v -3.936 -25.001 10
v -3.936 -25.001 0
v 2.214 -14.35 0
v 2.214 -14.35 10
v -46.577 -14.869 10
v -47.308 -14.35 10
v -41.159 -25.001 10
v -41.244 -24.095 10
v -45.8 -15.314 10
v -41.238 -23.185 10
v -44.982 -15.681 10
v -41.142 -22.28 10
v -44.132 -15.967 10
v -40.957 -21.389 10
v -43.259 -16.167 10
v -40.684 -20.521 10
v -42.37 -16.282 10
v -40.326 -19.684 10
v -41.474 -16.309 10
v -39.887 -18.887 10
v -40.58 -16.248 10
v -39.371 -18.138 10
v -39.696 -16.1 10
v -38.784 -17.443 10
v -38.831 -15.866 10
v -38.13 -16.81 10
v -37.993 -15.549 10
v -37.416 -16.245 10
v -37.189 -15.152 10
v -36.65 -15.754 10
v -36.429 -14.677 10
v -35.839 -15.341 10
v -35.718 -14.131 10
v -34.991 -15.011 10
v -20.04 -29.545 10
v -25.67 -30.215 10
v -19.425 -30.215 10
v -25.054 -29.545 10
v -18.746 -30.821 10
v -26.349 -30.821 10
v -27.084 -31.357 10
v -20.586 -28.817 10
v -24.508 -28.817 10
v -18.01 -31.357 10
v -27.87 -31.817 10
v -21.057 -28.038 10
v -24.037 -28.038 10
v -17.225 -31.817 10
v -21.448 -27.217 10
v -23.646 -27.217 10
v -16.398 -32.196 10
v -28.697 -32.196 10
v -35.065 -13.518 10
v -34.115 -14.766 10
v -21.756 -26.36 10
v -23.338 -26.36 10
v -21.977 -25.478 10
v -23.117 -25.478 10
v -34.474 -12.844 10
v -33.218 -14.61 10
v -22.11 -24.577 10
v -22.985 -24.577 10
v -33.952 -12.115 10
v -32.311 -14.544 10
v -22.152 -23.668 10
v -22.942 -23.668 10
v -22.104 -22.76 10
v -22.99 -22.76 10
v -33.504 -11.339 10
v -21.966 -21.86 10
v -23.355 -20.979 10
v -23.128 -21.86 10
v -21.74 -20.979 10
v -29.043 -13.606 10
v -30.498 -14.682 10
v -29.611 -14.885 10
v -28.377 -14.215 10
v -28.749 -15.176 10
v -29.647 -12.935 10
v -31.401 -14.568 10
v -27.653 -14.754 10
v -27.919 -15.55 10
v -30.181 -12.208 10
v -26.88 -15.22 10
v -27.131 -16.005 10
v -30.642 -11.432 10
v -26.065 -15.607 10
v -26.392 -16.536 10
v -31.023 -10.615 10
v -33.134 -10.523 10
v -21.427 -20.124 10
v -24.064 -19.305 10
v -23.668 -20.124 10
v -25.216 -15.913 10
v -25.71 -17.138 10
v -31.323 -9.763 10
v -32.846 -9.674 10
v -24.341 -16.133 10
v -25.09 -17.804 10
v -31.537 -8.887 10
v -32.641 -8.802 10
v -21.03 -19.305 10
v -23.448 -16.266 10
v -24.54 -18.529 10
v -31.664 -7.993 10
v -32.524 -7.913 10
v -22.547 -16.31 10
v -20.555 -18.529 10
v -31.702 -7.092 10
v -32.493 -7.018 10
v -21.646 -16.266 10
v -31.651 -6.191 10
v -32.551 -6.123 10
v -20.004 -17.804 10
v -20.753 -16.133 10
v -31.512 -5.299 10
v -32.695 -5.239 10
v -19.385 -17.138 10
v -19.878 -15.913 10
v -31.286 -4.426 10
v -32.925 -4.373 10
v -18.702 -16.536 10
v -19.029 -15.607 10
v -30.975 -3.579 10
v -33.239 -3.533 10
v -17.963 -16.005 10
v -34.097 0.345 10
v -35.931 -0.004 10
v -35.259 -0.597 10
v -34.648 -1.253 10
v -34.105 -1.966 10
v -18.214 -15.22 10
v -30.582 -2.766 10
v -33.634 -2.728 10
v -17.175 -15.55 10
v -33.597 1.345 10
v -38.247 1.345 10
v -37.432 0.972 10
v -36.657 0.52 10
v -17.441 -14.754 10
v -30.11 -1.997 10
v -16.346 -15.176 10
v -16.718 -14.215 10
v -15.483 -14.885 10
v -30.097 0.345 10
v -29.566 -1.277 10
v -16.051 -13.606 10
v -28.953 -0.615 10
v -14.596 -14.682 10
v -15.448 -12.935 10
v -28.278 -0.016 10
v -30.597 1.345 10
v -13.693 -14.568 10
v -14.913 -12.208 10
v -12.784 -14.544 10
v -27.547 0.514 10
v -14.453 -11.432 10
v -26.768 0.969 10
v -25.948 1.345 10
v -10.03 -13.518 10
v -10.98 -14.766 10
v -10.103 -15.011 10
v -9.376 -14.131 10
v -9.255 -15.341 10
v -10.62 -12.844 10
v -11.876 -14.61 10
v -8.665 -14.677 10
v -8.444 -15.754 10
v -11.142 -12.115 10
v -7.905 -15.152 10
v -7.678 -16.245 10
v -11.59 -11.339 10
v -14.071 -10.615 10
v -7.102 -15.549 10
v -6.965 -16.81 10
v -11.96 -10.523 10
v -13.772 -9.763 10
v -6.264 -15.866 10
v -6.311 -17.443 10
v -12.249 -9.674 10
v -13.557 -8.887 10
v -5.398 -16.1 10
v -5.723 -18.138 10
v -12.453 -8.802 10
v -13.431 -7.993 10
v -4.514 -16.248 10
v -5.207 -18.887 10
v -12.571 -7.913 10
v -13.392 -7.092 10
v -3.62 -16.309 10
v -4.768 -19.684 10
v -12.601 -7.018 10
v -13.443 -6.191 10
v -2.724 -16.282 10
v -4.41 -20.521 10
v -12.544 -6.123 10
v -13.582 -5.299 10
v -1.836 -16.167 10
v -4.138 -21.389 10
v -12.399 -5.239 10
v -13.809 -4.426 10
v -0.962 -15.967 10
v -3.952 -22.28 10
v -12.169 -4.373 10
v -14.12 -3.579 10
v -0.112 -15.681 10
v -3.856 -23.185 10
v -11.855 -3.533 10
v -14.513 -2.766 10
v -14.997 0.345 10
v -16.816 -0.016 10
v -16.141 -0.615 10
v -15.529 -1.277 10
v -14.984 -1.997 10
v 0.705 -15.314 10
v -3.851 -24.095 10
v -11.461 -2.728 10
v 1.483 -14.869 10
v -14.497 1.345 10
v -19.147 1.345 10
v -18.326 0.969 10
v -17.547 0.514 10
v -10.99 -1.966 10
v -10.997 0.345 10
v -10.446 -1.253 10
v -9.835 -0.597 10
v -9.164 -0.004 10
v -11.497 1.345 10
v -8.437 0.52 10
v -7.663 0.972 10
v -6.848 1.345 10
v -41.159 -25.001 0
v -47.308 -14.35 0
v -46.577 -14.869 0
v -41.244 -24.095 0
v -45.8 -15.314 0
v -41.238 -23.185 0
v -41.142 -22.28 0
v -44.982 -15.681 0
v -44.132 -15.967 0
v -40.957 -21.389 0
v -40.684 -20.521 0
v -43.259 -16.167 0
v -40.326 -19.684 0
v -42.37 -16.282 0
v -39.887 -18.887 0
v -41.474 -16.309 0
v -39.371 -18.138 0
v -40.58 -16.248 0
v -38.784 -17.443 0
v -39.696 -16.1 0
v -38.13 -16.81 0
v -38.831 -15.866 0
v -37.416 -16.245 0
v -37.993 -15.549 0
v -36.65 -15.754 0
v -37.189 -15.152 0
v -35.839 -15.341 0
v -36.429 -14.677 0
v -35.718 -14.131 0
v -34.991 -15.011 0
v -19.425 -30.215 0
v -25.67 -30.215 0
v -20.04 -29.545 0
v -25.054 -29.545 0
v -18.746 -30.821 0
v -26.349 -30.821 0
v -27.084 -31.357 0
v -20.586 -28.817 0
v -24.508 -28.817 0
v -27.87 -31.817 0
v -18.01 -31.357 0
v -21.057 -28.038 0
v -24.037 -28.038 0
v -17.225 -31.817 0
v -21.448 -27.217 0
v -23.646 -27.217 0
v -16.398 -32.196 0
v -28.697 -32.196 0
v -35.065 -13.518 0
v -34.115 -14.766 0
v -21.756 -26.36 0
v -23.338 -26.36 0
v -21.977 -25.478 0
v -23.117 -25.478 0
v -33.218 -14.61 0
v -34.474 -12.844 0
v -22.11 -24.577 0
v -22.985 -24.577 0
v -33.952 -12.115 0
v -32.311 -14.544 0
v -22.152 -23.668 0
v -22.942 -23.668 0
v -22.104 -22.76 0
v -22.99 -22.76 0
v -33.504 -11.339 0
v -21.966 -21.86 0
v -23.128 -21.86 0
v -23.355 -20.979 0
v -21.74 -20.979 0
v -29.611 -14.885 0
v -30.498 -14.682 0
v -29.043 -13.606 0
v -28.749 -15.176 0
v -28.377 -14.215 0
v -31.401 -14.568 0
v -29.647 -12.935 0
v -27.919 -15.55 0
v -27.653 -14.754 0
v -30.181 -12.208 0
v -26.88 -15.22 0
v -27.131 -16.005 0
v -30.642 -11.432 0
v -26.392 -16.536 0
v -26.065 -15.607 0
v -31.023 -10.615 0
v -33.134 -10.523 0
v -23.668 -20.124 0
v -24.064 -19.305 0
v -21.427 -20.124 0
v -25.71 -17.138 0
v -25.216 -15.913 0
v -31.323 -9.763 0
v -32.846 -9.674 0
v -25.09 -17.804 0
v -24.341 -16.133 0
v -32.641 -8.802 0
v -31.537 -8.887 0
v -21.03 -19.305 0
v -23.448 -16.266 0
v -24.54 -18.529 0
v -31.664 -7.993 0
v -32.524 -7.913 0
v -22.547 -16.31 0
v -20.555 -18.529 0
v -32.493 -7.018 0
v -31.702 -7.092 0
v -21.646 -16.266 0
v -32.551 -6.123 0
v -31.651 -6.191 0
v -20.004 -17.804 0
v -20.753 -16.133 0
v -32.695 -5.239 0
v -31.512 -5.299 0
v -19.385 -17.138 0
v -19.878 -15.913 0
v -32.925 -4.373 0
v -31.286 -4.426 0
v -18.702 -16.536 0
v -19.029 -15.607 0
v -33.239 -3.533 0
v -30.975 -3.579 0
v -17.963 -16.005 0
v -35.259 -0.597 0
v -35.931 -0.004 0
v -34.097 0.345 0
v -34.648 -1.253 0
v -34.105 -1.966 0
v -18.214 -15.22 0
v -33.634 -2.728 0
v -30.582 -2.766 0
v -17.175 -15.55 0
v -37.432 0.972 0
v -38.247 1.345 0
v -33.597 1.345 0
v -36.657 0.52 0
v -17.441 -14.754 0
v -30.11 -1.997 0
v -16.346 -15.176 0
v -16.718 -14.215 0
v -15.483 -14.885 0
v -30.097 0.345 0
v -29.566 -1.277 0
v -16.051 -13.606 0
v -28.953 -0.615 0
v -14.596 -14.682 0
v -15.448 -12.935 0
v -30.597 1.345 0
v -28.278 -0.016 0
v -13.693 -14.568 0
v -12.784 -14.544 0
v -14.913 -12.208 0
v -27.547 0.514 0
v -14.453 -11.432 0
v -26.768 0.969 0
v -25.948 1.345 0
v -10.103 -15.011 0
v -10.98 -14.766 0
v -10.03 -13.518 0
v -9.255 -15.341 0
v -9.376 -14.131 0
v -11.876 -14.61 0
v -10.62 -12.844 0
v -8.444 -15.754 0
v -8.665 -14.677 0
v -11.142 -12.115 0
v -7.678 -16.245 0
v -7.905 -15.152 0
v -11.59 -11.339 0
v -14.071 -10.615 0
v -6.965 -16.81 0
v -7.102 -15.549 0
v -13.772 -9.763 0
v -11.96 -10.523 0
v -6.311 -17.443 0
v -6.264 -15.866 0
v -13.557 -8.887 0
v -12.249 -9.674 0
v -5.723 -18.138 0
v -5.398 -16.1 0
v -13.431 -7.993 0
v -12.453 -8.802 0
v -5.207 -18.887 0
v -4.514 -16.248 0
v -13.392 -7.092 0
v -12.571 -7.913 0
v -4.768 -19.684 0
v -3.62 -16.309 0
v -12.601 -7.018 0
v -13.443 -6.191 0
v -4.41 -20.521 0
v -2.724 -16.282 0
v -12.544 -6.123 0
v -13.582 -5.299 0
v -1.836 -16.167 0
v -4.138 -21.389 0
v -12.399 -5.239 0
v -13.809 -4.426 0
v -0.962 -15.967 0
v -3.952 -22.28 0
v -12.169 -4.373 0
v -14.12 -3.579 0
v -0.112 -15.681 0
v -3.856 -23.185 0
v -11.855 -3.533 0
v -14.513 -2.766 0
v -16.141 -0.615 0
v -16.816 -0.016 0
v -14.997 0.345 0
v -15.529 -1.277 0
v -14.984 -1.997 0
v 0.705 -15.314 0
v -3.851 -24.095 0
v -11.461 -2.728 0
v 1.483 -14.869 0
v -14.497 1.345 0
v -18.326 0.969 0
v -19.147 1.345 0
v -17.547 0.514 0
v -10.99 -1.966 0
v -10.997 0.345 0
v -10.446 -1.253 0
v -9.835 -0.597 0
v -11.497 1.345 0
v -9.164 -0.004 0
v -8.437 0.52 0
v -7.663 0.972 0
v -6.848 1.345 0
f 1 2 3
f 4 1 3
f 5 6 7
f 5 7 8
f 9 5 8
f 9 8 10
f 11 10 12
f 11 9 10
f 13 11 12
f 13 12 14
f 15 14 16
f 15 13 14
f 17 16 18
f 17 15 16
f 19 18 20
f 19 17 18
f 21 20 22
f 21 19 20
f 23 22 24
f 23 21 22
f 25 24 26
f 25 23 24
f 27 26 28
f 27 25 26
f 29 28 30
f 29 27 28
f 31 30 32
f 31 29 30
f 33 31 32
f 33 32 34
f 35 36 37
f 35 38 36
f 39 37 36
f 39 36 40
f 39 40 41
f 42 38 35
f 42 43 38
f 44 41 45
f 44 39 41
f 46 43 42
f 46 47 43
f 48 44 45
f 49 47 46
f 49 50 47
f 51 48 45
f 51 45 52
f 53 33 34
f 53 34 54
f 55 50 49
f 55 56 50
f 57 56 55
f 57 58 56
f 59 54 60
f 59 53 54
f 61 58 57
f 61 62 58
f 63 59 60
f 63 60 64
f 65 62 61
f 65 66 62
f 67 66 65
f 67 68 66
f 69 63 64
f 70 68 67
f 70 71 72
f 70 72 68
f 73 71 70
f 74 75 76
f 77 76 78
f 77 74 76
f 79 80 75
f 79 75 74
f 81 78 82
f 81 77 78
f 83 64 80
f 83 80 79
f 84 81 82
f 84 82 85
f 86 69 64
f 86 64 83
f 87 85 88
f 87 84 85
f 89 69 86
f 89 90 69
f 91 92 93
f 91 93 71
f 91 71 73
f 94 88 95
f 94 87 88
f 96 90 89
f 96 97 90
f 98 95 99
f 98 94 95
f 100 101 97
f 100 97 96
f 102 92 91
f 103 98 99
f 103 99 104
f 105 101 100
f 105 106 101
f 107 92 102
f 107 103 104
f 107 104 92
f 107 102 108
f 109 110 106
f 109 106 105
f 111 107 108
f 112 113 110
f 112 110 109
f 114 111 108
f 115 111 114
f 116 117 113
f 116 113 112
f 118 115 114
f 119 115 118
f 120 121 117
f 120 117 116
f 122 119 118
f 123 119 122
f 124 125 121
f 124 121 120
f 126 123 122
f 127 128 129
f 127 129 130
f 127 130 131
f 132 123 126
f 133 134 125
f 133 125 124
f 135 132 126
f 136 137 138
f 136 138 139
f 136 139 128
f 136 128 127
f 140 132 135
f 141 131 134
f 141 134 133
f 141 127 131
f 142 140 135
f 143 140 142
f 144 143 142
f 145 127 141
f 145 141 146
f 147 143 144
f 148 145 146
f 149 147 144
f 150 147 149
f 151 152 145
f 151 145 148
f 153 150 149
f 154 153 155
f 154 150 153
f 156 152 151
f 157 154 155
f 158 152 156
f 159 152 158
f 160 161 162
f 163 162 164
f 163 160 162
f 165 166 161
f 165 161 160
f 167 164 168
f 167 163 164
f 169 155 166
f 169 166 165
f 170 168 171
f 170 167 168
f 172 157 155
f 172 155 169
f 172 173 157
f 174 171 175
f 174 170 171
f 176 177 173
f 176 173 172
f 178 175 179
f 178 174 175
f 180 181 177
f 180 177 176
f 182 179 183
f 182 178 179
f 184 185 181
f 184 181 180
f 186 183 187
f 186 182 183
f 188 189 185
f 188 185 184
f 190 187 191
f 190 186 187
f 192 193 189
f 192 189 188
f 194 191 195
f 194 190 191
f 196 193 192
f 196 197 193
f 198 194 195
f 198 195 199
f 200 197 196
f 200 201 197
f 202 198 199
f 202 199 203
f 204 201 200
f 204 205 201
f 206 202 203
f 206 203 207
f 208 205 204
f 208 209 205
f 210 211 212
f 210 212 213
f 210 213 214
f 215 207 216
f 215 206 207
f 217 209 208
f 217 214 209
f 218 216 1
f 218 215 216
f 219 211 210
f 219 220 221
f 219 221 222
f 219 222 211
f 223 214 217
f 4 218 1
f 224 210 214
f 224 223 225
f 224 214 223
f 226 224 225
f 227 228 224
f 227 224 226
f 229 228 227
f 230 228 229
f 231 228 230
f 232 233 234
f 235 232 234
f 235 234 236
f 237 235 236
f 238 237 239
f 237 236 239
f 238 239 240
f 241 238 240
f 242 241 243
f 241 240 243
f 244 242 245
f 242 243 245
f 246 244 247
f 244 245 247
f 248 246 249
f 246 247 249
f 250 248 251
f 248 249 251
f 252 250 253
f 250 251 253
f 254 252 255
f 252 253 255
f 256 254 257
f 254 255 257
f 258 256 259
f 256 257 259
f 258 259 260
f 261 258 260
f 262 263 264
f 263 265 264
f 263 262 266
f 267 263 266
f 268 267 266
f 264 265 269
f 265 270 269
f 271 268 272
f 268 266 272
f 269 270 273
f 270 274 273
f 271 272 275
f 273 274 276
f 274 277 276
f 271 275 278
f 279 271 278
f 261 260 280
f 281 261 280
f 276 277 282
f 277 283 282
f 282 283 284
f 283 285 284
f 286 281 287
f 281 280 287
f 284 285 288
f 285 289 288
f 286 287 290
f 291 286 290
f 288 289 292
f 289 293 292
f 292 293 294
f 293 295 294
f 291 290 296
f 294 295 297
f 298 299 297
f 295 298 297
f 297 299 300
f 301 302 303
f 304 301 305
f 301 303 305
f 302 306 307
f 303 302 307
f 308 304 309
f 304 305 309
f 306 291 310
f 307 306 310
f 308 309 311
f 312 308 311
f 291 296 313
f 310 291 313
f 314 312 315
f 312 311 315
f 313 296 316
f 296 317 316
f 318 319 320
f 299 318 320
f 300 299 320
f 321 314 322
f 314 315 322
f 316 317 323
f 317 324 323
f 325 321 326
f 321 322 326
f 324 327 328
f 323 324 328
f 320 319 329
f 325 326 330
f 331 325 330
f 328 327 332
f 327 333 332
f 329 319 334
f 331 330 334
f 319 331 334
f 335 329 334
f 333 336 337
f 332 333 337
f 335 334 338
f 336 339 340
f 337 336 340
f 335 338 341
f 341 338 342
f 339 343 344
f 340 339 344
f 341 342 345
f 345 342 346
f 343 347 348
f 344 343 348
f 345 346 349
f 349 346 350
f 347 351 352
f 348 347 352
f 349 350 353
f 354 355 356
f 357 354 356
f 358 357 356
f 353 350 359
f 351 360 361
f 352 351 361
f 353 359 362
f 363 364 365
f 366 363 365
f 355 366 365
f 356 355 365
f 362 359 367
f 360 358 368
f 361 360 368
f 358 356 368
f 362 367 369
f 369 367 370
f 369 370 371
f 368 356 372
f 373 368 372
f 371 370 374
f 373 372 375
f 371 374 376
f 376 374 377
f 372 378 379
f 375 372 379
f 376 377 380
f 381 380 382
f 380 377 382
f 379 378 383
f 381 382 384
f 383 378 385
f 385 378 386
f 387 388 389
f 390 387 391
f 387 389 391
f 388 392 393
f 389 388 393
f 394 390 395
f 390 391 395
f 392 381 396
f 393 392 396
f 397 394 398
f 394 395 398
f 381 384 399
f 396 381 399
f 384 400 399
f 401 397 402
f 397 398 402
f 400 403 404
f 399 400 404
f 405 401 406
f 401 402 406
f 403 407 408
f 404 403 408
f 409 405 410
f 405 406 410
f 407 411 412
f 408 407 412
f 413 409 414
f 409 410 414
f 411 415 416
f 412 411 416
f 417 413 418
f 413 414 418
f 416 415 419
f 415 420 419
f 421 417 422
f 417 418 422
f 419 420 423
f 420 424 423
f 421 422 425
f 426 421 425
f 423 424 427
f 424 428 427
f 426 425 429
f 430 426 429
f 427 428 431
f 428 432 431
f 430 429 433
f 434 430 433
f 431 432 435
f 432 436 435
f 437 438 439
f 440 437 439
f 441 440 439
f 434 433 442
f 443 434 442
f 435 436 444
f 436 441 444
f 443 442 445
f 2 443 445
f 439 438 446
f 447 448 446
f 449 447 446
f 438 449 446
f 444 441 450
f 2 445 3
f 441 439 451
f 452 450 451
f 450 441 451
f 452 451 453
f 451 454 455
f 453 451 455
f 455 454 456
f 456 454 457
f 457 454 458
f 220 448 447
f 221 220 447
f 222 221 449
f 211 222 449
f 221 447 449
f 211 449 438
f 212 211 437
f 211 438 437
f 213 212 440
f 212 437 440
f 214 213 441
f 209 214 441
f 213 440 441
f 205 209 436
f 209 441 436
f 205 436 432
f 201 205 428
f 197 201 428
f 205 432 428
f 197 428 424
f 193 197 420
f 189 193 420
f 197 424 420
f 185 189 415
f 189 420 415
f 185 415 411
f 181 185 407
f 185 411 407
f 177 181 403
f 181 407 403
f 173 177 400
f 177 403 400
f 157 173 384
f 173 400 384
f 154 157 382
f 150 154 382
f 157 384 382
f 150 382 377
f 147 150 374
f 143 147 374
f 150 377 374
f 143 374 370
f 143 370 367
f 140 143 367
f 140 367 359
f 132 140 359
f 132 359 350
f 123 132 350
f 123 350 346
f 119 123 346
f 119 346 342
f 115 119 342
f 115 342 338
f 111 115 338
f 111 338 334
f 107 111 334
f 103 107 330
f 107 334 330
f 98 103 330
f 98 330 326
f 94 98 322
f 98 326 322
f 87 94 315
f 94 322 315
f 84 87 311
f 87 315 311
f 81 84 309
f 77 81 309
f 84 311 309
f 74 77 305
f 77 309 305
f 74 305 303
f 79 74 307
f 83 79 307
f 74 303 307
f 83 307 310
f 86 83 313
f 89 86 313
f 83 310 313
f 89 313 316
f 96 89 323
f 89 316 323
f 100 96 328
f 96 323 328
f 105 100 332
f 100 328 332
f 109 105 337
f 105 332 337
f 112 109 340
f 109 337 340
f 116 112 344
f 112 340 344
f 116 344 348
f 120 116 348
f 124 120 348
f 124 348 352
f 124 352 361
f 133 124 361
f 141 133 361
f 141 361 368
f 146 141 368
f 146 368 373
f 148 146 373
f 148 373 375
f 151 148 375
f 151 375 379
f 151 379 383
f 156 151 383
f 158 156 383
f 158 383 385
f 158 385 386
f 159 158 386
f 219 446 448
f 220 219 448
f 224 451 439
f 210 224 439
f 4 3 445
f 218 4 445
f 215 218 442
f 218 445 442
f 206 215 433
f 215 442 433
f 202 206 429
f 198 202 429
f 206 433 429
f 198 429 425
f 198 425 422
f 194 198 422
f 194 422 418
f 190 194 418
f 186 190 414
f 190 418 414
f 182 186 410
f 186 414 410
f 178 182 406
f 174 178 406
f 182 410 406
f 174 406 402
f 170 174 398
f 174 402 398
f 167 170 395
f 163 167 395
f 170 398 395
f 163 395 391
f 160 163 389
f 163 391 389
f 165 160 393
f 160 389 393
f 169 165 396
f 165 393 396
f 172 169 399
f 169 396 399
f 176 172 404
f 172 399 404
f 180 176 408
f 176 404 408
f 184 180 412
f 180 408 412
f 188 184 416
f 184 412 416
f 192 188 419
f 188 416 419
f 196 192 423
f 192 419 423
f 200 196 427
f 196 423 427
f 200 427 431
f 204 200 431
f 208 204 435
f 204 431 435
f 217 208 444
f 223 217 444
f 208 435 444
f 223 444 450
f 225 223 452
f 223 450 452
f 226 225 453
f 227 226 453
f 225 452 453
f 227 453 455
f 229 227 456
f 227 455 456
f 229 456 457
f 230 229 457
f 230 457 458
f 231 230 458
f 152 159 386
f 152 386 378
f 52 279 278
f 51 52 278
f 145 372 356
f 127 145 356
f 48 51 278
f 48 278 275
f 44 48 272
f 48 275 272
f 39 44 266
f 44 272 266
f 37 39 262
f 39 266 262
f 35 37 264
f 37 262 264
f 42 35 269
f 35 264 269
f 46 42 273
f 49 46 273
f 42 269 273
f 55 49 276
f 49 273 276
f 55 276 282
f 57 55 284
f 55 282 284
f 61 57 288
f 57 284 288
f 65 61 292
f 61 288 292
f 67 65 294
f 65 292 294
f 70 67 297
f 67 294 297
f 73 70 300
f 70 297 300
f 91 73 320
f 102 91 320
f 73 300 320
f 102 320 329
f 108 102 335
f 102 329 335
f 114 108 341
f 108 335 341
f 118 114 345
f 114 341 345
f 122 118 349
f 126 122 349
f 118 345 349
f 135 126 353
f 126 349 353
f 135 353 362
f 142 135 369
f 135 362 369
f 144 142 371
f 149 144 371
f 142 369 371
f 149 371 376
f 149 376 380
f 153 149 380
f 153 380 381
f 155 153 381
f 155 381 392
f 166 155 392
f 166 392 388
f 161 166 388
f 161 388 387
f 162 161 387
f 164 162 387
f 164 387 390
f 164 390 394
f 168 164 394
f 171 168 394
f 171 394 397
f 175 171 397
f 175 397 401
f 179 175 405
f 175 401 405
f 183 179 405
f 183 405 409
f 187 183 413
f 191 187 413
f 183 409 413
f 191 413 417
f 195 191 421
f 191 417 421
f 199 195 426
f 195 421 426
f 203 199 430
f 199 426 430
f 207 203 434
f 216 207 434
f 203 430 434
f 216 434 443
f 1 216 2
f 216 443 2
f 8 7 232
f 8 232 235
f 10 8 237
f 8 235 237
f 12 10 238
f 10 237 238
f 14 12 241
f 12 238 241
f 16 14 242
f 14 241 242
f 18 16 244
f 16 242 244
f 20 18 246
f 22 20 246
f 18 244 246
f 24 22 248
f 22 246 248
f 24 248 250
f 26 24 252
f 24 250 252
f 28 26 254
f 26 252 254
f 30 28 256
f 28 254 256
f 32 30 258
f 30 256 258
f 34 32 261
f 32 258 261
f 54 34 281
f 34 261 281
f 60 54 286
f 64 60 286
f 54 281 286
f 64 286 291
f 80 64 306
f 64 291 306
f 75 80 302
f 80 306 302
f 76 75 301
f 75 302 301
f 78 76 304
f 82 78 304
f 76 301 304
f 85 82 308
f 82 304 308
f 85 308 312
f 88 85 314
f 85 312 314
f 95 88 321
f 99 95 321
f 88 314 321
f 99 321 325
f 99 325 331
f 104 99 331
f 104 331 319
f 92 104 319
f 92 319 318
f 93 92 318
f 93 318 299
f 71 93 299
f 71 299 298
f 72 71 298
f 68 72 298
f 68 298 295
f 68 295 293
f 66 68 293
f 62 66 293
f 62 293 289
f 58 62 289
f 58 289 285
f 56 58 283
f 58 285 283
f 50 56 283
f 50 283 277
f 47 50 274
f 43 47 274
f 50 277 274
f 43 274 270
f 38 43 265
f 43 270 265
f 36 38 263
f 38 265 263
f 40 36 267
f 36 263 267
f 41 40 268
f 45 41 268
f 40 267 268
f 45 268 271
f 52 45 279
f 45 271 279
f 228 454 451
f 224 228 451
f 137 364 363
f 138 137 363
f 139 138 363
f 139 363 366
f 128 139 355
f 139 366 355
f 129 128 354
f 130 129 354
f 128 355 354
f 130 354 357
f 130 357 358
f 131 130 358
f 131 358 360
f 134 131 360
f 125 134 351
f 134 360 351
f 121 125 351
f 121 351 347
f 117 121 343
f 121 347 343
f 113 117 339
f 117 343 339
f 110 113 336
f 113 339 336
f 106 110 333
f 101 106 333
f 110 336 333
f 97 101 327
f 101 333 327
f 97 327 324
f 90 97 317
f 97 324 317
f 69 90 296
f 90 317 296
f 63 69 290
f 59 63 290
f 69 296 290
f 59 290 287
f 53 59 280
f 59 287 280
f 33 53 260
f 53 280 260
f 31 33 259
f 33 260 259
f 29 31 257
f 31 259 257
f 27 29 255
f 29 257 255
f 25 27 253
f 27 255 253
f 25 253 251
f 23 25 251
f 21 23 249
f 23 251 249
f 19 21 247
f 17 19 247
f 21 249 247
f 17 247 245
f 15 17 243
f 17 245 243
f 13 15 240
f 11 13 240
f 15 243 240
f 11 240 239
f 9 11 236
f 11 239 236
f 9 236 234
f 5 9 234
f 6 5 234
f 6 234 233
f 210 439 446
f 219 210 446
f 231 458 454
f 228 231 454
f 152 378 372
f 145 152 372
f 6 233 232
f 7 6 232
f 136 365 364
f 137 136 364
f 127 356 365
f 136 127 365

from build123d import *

# Parameters (mm, degrees)
BOSS_EXTRUDE1_DEPTH = 10
CUT_EXTRUDE1_DEPTH  = 11


with BuildPart() as part:
    # Sketch4 → Boss-Extrude1 (new body)
    with BuildSketch(Plane.XY):
        with BuildLine():
            Line((-47.308119418, -14.350263576), (-41.158711278, -25.001350911))
            ThreePointArc((-41.158711278, -25.001350911), (-27.519699416, -15.767887278), (-28.696607556, -32.196349849))
            Line((-28.696607556, -32.196349849), (-16.397791276, -32.196349849))
            ThreePointArc((-16.397791276, -32.196349849), (-17.574699416, -15.767887278), (-3.935687554, -25.001350911))
            Line((-3.935687554, -25.001350911), (2.213720586, -14.350263576))
            ThreePointArc((2.213720586, -14.350263576), (-11.375661988, -11.732764637), (-6.847791276, 1.344735363))
            Line((-6.847791276, 1.344735363), (-19.146607556, 1.344735363))
            ThreePointArc((-19.146607556, 1.344735363), (-22.547199416, -16.310264637), (-25.947791276, 1.344735363))
            Line((-25.947791276, 1.344735363), (-38.246607556, 1.344735363))
            ThreePointArc((-38.246607556, 1.344735363), (-33.718736844, -11.732764637), (-47.308119418, -14.350263576))
        make_face()
    extrude(amount=BOSS_EXTRUDE1_DEPTH)

    # Sketch5 → Cut-Extrude1 (cut, through all)
    with BuildSketch(Plane(origin=(0, 0, 0), x_dir=(-1, 0, 0), z_dir=(0, 0, -1))):
        Polygon((12.997199416, 1.344735363), (12.997199416, 0.344735363), (14.997199416, 0.344735363), (14.497199416, 1.344735363), align=None)
        Polygon((11.497199416, 1.344735363), (10.997199416, 0.344735363), (12.997199416, 0.344735363), (12.997199416, 1.344735363), align=None)
        Polygon((32.097199416, 0.344735363), (32.097199416, 1.344735363), (30.597199416, 1.344735363), (30.097199416, 0.344735363), align=None)
        Polygon((33.597199416, 1.344735363), (32.097199416, 1.344735363), (32.097199416, 0.344735363), (34.097199416, 0.344735363), align=None)
    extrude(amount=-CUT_EXTRUDE1_DEPTH, mode=Mode.SUBTRACT)


solid = part.part
